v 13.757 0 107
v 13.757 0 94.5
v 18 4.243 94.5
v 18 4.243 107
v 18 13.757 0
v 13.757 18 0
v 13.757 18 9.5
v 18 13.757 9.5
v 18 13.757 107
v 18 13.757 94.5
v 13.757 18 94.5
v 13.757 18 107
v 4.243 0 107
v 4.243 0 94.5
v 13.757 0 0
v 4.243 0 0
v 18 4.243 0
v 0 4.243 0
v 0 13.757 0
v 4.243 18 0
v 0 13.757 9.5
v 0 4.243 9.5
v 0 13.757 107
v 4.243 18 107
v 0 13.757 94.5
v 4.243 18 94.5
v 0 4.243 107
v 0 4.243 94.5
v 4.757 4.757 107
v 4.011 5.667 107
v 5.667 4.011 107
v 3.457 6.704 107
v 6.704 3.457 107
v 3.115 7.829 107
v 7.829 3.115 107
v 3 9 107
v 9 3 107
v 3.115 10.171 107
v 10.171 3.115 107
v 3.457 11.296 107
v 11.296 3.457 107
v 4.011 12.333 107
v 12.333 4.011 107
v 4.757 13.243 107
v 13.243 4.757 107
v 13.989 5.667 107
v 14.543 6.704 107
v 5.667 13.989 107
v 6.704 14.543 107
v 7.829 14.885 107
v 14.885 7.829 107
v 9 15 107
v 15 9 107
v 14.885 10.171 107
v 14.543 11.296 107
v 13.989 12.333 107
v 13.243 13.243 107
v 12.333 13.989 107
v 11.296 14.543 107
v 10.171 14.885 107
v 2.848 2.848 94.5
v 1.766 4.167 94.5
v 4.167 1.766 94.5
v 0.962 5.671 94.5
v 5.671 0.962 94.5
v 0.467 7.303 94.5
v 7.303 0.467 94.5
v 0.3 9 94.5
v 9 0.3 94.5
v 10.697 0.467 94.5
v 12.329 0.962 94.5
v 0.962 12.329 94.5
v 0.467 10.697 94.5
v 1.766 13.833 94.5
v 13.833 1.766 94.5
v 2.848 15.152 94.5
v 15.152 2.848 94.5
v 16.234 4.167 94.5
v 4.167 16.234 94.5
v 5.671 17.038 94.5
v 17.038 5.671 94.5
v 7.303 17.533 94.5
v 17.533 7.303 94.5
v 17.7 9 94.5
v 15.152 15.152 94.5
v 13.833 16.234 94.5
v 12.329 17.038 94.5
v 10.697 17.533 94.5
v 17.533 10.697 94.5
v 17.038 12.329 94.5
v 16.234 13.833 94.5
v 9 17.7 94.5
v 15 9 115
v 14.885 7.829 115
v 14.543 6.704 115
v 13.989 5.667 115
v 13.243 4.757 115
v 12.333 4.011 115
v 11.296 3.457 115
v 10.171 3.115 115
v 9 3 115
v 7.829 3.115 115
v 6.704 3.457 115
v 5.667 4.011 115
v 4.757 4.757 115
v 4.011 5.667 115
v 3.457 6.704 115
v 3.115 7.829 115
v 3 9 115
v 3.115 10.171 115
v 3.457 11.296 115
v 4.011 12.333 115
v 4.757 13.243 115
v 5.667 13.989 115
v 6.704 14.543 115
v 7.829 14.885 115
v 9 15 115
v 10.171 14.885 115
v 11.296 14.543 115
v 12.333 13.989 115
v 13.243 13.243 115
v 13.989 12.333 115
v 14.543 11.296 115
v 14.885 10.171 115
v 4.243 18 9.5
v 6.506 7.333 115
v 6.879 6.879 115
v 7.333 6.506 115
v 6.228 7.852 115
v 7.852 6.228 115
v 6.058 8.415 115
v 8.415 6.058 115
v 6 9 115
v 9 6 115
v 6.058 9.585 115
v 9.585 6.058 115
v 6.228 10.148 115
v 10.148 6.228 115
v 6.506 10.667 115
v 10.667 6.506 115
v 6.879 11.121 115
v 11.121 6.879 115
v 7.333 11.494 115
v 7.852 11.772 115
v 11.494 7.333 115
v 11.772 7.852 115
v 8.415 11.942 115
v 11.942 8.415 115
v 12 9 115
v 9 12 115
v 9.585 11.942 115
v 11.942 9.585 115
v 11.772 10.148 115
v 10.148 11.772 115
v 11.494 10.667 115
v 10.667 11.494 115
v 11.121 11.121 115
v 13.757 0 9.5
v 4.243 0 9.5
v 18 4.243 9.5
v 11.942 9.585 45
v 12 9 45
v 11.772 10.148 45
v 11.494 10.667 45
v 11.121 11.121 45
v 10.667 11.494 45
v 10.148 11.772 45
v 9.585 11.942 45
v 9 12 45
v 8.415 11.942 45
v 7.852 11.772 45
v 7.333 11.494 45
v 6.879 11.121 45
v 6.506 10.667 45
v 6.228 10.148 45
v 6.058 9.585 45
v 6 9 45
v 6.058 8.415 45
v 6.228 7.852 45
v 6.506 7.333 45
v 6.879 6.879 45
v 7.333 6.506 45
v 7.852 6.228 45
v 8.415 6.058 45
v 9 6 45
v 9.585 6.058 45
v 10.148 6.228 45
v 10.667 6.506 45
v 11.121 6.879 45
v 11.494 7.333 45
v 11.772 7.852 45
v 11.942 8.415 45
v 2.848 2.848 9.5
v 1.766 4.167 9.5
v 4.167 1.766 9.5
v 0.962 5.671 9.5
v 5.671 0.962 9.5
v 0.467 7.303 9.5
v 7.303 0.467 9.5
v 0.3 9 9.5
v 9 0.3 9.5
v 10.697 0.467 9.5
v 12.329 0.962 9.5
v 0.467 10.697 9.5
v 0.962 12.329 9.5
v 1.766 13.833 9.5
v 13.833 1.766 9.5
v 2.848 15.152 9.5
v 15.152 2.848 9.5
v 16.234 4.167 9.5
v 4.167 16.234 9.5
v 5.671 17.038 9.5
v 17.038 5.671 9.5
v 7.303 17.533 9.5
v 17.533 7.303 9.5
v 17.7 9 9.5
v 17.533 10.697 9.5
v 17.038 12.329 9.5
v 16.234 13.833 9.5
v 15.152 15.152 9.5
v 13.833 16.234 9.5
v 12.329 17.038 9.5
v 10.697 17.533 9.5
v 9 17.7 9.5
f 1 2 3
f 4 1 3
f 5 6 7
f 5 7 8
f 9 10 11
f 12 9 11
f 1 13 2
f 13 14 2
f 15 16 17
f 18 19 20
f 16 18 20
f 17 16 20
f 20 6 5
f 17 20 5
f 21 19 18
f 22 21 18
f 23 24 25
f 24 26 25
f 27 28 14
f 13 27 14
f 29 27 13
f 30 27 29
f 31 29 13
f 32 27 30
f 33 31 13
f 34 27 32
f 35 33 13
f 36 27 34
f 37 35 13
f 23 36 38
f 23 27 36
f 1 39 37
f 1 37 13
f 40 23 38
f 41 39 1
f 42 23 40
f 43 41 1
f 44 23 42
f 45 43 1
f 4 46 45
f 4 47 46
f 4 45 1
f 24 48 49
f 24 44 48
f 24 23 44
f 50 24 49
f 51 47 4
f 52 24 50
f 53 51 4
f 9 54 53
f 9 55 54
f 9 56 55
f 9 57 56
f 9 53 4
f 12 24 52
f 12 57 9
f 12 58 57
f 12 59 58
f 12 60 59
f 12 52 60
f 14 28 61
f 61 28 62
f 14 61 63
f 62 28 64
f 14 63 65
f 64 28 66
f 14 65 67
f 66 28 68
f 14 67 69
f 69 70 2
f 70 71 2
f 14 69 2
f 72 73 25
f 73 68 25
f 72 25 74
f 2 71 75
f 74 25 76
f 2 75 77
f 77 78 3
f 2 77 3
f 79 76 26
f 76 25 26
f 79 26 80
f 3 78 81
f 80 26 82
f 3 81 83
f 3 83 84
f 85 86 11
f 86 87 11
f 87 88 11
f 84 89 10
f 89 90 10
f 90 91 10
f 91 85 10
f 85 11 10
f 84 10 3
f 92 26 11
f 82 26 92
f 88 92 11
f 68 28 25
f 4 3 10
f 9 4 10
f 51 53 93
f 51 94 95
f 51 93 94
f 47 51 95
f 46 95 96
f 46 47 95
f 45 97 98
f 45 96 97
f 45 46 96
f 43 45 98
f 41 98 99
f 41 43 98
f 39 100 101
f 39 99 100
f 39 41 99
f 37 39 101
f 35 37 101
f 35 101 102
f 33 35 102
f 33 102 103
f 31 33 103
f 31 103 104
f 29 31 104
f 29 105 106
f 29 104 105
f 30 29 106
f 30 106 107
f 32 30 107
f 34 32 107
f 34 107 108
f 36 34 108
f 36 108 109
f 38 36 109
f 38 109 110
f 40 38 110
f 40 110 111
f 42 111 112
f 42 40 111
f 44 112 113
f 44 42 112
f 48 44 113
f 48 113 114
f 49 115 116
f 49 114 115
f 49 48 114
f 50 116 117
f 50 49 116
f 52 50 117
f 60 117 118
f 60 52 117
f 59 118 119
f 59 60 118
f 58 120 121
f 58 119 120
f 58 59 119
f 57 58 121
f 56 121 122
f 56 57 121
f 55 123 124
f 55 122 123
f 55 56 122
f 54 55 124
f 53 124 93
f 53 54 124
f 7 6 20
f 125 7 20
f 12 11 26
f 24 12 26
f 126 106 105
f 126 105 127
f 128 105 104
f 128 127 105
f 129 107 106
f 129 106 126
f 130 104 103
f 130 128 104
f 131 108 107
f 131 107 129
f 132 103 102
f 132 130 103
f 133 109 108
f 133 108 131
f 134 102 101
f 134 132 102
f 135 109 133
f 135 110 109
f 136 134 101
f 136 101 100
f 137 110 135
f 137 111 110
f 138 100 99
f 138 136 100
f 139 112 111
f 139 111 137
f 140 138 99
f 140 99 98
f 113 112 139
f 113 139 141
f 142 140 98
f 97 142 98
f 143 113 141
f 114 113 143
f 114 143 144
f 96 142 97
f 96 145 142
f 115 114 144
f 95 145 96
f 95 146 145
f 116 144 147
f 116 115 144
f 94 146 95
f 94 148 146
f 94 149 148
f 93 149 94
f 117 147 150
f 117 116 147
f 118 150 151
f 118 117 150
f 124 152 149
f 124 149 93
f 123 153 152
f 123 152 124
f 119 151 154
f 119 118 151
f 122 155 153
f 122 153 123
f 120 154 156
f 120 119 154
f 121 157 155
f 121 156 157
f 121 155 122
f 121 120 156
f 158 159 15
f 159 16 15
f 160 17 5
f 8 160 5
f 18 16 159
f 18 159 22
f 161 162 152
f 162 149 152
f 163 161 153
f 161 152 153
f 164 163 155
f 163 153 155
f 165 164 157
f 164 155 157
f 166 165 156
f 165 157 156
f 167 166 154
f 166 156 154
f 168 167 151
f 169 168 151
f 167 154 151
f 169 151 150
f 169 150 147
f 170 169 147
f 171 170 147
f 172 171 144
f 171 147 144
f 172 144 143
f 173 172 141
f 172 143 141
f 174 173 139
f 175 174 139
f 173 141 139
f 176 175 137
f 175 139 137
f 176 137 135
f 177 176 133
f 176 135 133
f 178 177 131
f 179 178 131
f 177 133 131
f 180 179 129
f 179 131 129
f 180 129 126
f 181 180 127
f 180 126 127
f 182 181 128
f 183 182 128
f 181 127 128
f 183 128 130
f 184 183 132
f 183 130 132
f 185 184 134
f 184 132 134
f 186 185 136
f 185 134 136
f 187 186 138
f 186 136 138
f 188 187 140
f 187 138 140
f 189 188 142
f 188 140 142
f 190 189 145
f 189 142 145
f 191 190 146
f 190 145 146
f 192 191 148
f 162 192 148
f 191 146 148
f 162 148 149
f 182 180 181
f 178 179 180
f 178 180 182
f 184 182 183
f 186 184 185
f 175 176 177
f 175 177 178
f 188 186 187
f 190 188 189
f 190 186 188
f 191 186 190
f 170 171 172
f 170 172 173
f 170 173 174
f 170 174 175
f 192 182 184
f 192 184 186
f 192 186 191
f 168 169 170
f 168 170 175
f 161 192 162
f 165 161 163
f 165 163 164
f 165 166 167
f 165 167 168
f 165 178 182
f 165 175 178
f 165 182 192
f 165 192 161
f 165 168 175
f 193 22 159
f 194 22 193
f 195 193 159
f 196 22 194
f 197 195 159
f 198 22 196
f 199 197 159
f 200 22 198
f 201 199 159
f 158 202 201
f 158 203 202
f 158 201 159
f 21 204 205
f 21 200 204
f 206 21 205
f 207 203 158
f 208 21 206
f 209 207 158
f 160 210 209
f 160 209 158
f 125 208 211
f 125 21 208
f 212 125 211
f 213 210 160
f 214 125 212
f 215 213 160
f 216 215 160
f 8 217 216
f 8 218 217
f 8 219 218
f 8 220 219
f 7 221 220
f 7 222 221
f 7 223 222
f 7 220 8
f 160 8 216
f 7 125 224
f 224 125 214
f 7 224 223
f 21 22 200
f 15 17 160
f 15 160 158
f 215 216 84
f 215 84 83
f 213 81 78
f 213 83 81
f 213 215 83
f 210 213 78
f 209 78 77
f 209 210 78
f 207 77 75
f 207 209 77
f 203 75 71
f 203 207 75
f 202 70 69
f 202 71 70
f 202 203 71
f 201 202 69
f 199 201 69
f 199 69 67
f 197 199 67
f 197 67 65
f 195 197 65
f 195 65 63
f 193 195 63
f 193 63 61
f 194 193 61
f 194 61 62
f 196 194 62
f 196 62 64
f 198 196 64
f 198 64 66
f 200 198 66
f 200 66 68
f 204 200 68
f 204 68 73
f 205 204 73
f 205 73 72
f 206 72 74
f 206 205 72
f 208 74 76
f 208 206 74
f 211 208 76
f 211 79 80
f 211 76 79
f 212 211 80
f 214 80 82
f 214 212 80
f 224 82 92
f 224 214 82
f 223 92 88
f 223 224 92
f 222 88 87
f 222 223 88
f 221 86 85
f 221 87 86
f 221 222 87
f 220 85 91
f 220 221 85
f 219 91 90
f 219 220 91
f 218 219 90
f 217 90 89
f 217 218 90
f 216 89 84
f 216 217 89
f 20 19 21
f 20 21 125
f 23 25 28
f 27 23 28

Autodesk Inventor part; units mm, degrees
ref_plane "YZ Plane" through (0, 0, 0) normal (1, 0, 0) x (0, 1, 0)
ref_plane "XZ Plane" through (0, 0, 0) normal (0, 1, 0) x (-1, 0, 0)
ref_plane "XY Plane" through (0, 0, 0) normal (0, 0, 1) x (1, 0, 0)
sketch "スケッチ1" plane through (0, 0, 0) normal (0, 0, 1) x (1, 0, 0)
  line L0 (0, 0) -> (18, 0)
  line L1 (18, 0) -> (18, 18)
  line L2 (18, 18) -> (0, 18)
  line L3 (0, 18) -> (0, 0)
  line L4 (0, 13.7574) -> (4.2426, 18)
  line L5 (0, 13.7574) -> (6, 13.7574) construction
  line L6 (4.2426, 0) -> (0, 4.2426)
  line L7 (18, 4.2426) -> (13.7574, 0)
  line L8 (13.7574, 18) -> (18, 13.7574)
  point P0 (0, 9)
  point P1 (9, 18)
  point P2 (9, 9)
  dimension "d0" = 18
  dimension "d1" = 18
  dimension "d2" = 45
  dimension "d3" = 3
  dimension "d13" = 9
  dimension "d14" = 9
  dimension "d17" = 360
extrude "押し出し1" add sketch "スケッチ1" along normal blind 9.5 contours L6 L3 L4 L2 L8 L1 L7 L0
sketch "スケッチ2" plane through (0, 0, 9.5) normal (0, 0, 1) x (1, 0, 0)
  line L0 (0, 0) -> (13.7574, 0) projected
  line L1 (0, 13.7574) -> (0, 0) projected
  circle A0 centre (9, 9) radius 8.7
  point P0 (9, 0)
  point P1 (5.6569, 0)
  point P2 (12.3431, 0)
  point P3 (0, 9.7071)
  point P4 (0, 5.6569)
  point P5 (18, 0)
  point P6 (0, 18)
  dimension "d10" = 17.4
extrude "押し出し2" add sketch "スケッチ2" along normal blind 85
sketch "スケッチ3" plane through (9, 9, 94.5) normal (0, 0, 1) x (1, 0, 0)
  circle A0 centre (0, 0) radius 8.7 projected
  line L0 (4.7574, 9) -> (-4.7574, 9) projected
  line L1 (-4.7574, 9) -> (-9, 4.7574) projected
  line L2 (-9, 4.7574) -> (-9, -4.7574) projected
  line L3 (-9, -4.7574) -> (-4.7574, -9) projected
  line L4 (-4.7574, -9) -> (4.7574, -9) projected
  line L5 (4.7574, -9) -> (9, -4.7574) projected
  line L6 (9, -4.7574) -> (9, 4.7574) projected
  line L7 (9, 4.7574) -> (4.7574, 9) projected
  point P0 (-9, -9)
extrude "押し出し3" add sketch "スケッチ3" along normal blind 12.5 contours A0 | L7 L6 L5 L4 L3 L2 L1 L0
sketch "スケッチ4" plane through (9, 9, 107) normal (0, 0, 1) x (1, 0, 0)
  circle A0 centre (0, 0) radius 8.7 projected
  circle A1 centre (0, 0) radius 6
  point P0 (-9, -9)
  dimension "d21" = 12
extrude "押し出し4" add sketch "スケッチ4" along normal blind 8 contours A1
sketch "スケッチ5" plane through (9, 9, 115) normal (0, 0, 1) x (1, 0, 0)
  circle A0 centre (0, 0) radius 6 projected
  circle A1 centre (0, 0) radius 3
  point P0 (-9, -9)
  dimension "d24" = 6
extrude "押し出し5" cut sketch "スケッチ5" against normal blind 70 contours A1
equation "\"d13\" = 0.5 * d1"
properties part number "airclinder_60" material "アルミニウム 6061-AHC"
